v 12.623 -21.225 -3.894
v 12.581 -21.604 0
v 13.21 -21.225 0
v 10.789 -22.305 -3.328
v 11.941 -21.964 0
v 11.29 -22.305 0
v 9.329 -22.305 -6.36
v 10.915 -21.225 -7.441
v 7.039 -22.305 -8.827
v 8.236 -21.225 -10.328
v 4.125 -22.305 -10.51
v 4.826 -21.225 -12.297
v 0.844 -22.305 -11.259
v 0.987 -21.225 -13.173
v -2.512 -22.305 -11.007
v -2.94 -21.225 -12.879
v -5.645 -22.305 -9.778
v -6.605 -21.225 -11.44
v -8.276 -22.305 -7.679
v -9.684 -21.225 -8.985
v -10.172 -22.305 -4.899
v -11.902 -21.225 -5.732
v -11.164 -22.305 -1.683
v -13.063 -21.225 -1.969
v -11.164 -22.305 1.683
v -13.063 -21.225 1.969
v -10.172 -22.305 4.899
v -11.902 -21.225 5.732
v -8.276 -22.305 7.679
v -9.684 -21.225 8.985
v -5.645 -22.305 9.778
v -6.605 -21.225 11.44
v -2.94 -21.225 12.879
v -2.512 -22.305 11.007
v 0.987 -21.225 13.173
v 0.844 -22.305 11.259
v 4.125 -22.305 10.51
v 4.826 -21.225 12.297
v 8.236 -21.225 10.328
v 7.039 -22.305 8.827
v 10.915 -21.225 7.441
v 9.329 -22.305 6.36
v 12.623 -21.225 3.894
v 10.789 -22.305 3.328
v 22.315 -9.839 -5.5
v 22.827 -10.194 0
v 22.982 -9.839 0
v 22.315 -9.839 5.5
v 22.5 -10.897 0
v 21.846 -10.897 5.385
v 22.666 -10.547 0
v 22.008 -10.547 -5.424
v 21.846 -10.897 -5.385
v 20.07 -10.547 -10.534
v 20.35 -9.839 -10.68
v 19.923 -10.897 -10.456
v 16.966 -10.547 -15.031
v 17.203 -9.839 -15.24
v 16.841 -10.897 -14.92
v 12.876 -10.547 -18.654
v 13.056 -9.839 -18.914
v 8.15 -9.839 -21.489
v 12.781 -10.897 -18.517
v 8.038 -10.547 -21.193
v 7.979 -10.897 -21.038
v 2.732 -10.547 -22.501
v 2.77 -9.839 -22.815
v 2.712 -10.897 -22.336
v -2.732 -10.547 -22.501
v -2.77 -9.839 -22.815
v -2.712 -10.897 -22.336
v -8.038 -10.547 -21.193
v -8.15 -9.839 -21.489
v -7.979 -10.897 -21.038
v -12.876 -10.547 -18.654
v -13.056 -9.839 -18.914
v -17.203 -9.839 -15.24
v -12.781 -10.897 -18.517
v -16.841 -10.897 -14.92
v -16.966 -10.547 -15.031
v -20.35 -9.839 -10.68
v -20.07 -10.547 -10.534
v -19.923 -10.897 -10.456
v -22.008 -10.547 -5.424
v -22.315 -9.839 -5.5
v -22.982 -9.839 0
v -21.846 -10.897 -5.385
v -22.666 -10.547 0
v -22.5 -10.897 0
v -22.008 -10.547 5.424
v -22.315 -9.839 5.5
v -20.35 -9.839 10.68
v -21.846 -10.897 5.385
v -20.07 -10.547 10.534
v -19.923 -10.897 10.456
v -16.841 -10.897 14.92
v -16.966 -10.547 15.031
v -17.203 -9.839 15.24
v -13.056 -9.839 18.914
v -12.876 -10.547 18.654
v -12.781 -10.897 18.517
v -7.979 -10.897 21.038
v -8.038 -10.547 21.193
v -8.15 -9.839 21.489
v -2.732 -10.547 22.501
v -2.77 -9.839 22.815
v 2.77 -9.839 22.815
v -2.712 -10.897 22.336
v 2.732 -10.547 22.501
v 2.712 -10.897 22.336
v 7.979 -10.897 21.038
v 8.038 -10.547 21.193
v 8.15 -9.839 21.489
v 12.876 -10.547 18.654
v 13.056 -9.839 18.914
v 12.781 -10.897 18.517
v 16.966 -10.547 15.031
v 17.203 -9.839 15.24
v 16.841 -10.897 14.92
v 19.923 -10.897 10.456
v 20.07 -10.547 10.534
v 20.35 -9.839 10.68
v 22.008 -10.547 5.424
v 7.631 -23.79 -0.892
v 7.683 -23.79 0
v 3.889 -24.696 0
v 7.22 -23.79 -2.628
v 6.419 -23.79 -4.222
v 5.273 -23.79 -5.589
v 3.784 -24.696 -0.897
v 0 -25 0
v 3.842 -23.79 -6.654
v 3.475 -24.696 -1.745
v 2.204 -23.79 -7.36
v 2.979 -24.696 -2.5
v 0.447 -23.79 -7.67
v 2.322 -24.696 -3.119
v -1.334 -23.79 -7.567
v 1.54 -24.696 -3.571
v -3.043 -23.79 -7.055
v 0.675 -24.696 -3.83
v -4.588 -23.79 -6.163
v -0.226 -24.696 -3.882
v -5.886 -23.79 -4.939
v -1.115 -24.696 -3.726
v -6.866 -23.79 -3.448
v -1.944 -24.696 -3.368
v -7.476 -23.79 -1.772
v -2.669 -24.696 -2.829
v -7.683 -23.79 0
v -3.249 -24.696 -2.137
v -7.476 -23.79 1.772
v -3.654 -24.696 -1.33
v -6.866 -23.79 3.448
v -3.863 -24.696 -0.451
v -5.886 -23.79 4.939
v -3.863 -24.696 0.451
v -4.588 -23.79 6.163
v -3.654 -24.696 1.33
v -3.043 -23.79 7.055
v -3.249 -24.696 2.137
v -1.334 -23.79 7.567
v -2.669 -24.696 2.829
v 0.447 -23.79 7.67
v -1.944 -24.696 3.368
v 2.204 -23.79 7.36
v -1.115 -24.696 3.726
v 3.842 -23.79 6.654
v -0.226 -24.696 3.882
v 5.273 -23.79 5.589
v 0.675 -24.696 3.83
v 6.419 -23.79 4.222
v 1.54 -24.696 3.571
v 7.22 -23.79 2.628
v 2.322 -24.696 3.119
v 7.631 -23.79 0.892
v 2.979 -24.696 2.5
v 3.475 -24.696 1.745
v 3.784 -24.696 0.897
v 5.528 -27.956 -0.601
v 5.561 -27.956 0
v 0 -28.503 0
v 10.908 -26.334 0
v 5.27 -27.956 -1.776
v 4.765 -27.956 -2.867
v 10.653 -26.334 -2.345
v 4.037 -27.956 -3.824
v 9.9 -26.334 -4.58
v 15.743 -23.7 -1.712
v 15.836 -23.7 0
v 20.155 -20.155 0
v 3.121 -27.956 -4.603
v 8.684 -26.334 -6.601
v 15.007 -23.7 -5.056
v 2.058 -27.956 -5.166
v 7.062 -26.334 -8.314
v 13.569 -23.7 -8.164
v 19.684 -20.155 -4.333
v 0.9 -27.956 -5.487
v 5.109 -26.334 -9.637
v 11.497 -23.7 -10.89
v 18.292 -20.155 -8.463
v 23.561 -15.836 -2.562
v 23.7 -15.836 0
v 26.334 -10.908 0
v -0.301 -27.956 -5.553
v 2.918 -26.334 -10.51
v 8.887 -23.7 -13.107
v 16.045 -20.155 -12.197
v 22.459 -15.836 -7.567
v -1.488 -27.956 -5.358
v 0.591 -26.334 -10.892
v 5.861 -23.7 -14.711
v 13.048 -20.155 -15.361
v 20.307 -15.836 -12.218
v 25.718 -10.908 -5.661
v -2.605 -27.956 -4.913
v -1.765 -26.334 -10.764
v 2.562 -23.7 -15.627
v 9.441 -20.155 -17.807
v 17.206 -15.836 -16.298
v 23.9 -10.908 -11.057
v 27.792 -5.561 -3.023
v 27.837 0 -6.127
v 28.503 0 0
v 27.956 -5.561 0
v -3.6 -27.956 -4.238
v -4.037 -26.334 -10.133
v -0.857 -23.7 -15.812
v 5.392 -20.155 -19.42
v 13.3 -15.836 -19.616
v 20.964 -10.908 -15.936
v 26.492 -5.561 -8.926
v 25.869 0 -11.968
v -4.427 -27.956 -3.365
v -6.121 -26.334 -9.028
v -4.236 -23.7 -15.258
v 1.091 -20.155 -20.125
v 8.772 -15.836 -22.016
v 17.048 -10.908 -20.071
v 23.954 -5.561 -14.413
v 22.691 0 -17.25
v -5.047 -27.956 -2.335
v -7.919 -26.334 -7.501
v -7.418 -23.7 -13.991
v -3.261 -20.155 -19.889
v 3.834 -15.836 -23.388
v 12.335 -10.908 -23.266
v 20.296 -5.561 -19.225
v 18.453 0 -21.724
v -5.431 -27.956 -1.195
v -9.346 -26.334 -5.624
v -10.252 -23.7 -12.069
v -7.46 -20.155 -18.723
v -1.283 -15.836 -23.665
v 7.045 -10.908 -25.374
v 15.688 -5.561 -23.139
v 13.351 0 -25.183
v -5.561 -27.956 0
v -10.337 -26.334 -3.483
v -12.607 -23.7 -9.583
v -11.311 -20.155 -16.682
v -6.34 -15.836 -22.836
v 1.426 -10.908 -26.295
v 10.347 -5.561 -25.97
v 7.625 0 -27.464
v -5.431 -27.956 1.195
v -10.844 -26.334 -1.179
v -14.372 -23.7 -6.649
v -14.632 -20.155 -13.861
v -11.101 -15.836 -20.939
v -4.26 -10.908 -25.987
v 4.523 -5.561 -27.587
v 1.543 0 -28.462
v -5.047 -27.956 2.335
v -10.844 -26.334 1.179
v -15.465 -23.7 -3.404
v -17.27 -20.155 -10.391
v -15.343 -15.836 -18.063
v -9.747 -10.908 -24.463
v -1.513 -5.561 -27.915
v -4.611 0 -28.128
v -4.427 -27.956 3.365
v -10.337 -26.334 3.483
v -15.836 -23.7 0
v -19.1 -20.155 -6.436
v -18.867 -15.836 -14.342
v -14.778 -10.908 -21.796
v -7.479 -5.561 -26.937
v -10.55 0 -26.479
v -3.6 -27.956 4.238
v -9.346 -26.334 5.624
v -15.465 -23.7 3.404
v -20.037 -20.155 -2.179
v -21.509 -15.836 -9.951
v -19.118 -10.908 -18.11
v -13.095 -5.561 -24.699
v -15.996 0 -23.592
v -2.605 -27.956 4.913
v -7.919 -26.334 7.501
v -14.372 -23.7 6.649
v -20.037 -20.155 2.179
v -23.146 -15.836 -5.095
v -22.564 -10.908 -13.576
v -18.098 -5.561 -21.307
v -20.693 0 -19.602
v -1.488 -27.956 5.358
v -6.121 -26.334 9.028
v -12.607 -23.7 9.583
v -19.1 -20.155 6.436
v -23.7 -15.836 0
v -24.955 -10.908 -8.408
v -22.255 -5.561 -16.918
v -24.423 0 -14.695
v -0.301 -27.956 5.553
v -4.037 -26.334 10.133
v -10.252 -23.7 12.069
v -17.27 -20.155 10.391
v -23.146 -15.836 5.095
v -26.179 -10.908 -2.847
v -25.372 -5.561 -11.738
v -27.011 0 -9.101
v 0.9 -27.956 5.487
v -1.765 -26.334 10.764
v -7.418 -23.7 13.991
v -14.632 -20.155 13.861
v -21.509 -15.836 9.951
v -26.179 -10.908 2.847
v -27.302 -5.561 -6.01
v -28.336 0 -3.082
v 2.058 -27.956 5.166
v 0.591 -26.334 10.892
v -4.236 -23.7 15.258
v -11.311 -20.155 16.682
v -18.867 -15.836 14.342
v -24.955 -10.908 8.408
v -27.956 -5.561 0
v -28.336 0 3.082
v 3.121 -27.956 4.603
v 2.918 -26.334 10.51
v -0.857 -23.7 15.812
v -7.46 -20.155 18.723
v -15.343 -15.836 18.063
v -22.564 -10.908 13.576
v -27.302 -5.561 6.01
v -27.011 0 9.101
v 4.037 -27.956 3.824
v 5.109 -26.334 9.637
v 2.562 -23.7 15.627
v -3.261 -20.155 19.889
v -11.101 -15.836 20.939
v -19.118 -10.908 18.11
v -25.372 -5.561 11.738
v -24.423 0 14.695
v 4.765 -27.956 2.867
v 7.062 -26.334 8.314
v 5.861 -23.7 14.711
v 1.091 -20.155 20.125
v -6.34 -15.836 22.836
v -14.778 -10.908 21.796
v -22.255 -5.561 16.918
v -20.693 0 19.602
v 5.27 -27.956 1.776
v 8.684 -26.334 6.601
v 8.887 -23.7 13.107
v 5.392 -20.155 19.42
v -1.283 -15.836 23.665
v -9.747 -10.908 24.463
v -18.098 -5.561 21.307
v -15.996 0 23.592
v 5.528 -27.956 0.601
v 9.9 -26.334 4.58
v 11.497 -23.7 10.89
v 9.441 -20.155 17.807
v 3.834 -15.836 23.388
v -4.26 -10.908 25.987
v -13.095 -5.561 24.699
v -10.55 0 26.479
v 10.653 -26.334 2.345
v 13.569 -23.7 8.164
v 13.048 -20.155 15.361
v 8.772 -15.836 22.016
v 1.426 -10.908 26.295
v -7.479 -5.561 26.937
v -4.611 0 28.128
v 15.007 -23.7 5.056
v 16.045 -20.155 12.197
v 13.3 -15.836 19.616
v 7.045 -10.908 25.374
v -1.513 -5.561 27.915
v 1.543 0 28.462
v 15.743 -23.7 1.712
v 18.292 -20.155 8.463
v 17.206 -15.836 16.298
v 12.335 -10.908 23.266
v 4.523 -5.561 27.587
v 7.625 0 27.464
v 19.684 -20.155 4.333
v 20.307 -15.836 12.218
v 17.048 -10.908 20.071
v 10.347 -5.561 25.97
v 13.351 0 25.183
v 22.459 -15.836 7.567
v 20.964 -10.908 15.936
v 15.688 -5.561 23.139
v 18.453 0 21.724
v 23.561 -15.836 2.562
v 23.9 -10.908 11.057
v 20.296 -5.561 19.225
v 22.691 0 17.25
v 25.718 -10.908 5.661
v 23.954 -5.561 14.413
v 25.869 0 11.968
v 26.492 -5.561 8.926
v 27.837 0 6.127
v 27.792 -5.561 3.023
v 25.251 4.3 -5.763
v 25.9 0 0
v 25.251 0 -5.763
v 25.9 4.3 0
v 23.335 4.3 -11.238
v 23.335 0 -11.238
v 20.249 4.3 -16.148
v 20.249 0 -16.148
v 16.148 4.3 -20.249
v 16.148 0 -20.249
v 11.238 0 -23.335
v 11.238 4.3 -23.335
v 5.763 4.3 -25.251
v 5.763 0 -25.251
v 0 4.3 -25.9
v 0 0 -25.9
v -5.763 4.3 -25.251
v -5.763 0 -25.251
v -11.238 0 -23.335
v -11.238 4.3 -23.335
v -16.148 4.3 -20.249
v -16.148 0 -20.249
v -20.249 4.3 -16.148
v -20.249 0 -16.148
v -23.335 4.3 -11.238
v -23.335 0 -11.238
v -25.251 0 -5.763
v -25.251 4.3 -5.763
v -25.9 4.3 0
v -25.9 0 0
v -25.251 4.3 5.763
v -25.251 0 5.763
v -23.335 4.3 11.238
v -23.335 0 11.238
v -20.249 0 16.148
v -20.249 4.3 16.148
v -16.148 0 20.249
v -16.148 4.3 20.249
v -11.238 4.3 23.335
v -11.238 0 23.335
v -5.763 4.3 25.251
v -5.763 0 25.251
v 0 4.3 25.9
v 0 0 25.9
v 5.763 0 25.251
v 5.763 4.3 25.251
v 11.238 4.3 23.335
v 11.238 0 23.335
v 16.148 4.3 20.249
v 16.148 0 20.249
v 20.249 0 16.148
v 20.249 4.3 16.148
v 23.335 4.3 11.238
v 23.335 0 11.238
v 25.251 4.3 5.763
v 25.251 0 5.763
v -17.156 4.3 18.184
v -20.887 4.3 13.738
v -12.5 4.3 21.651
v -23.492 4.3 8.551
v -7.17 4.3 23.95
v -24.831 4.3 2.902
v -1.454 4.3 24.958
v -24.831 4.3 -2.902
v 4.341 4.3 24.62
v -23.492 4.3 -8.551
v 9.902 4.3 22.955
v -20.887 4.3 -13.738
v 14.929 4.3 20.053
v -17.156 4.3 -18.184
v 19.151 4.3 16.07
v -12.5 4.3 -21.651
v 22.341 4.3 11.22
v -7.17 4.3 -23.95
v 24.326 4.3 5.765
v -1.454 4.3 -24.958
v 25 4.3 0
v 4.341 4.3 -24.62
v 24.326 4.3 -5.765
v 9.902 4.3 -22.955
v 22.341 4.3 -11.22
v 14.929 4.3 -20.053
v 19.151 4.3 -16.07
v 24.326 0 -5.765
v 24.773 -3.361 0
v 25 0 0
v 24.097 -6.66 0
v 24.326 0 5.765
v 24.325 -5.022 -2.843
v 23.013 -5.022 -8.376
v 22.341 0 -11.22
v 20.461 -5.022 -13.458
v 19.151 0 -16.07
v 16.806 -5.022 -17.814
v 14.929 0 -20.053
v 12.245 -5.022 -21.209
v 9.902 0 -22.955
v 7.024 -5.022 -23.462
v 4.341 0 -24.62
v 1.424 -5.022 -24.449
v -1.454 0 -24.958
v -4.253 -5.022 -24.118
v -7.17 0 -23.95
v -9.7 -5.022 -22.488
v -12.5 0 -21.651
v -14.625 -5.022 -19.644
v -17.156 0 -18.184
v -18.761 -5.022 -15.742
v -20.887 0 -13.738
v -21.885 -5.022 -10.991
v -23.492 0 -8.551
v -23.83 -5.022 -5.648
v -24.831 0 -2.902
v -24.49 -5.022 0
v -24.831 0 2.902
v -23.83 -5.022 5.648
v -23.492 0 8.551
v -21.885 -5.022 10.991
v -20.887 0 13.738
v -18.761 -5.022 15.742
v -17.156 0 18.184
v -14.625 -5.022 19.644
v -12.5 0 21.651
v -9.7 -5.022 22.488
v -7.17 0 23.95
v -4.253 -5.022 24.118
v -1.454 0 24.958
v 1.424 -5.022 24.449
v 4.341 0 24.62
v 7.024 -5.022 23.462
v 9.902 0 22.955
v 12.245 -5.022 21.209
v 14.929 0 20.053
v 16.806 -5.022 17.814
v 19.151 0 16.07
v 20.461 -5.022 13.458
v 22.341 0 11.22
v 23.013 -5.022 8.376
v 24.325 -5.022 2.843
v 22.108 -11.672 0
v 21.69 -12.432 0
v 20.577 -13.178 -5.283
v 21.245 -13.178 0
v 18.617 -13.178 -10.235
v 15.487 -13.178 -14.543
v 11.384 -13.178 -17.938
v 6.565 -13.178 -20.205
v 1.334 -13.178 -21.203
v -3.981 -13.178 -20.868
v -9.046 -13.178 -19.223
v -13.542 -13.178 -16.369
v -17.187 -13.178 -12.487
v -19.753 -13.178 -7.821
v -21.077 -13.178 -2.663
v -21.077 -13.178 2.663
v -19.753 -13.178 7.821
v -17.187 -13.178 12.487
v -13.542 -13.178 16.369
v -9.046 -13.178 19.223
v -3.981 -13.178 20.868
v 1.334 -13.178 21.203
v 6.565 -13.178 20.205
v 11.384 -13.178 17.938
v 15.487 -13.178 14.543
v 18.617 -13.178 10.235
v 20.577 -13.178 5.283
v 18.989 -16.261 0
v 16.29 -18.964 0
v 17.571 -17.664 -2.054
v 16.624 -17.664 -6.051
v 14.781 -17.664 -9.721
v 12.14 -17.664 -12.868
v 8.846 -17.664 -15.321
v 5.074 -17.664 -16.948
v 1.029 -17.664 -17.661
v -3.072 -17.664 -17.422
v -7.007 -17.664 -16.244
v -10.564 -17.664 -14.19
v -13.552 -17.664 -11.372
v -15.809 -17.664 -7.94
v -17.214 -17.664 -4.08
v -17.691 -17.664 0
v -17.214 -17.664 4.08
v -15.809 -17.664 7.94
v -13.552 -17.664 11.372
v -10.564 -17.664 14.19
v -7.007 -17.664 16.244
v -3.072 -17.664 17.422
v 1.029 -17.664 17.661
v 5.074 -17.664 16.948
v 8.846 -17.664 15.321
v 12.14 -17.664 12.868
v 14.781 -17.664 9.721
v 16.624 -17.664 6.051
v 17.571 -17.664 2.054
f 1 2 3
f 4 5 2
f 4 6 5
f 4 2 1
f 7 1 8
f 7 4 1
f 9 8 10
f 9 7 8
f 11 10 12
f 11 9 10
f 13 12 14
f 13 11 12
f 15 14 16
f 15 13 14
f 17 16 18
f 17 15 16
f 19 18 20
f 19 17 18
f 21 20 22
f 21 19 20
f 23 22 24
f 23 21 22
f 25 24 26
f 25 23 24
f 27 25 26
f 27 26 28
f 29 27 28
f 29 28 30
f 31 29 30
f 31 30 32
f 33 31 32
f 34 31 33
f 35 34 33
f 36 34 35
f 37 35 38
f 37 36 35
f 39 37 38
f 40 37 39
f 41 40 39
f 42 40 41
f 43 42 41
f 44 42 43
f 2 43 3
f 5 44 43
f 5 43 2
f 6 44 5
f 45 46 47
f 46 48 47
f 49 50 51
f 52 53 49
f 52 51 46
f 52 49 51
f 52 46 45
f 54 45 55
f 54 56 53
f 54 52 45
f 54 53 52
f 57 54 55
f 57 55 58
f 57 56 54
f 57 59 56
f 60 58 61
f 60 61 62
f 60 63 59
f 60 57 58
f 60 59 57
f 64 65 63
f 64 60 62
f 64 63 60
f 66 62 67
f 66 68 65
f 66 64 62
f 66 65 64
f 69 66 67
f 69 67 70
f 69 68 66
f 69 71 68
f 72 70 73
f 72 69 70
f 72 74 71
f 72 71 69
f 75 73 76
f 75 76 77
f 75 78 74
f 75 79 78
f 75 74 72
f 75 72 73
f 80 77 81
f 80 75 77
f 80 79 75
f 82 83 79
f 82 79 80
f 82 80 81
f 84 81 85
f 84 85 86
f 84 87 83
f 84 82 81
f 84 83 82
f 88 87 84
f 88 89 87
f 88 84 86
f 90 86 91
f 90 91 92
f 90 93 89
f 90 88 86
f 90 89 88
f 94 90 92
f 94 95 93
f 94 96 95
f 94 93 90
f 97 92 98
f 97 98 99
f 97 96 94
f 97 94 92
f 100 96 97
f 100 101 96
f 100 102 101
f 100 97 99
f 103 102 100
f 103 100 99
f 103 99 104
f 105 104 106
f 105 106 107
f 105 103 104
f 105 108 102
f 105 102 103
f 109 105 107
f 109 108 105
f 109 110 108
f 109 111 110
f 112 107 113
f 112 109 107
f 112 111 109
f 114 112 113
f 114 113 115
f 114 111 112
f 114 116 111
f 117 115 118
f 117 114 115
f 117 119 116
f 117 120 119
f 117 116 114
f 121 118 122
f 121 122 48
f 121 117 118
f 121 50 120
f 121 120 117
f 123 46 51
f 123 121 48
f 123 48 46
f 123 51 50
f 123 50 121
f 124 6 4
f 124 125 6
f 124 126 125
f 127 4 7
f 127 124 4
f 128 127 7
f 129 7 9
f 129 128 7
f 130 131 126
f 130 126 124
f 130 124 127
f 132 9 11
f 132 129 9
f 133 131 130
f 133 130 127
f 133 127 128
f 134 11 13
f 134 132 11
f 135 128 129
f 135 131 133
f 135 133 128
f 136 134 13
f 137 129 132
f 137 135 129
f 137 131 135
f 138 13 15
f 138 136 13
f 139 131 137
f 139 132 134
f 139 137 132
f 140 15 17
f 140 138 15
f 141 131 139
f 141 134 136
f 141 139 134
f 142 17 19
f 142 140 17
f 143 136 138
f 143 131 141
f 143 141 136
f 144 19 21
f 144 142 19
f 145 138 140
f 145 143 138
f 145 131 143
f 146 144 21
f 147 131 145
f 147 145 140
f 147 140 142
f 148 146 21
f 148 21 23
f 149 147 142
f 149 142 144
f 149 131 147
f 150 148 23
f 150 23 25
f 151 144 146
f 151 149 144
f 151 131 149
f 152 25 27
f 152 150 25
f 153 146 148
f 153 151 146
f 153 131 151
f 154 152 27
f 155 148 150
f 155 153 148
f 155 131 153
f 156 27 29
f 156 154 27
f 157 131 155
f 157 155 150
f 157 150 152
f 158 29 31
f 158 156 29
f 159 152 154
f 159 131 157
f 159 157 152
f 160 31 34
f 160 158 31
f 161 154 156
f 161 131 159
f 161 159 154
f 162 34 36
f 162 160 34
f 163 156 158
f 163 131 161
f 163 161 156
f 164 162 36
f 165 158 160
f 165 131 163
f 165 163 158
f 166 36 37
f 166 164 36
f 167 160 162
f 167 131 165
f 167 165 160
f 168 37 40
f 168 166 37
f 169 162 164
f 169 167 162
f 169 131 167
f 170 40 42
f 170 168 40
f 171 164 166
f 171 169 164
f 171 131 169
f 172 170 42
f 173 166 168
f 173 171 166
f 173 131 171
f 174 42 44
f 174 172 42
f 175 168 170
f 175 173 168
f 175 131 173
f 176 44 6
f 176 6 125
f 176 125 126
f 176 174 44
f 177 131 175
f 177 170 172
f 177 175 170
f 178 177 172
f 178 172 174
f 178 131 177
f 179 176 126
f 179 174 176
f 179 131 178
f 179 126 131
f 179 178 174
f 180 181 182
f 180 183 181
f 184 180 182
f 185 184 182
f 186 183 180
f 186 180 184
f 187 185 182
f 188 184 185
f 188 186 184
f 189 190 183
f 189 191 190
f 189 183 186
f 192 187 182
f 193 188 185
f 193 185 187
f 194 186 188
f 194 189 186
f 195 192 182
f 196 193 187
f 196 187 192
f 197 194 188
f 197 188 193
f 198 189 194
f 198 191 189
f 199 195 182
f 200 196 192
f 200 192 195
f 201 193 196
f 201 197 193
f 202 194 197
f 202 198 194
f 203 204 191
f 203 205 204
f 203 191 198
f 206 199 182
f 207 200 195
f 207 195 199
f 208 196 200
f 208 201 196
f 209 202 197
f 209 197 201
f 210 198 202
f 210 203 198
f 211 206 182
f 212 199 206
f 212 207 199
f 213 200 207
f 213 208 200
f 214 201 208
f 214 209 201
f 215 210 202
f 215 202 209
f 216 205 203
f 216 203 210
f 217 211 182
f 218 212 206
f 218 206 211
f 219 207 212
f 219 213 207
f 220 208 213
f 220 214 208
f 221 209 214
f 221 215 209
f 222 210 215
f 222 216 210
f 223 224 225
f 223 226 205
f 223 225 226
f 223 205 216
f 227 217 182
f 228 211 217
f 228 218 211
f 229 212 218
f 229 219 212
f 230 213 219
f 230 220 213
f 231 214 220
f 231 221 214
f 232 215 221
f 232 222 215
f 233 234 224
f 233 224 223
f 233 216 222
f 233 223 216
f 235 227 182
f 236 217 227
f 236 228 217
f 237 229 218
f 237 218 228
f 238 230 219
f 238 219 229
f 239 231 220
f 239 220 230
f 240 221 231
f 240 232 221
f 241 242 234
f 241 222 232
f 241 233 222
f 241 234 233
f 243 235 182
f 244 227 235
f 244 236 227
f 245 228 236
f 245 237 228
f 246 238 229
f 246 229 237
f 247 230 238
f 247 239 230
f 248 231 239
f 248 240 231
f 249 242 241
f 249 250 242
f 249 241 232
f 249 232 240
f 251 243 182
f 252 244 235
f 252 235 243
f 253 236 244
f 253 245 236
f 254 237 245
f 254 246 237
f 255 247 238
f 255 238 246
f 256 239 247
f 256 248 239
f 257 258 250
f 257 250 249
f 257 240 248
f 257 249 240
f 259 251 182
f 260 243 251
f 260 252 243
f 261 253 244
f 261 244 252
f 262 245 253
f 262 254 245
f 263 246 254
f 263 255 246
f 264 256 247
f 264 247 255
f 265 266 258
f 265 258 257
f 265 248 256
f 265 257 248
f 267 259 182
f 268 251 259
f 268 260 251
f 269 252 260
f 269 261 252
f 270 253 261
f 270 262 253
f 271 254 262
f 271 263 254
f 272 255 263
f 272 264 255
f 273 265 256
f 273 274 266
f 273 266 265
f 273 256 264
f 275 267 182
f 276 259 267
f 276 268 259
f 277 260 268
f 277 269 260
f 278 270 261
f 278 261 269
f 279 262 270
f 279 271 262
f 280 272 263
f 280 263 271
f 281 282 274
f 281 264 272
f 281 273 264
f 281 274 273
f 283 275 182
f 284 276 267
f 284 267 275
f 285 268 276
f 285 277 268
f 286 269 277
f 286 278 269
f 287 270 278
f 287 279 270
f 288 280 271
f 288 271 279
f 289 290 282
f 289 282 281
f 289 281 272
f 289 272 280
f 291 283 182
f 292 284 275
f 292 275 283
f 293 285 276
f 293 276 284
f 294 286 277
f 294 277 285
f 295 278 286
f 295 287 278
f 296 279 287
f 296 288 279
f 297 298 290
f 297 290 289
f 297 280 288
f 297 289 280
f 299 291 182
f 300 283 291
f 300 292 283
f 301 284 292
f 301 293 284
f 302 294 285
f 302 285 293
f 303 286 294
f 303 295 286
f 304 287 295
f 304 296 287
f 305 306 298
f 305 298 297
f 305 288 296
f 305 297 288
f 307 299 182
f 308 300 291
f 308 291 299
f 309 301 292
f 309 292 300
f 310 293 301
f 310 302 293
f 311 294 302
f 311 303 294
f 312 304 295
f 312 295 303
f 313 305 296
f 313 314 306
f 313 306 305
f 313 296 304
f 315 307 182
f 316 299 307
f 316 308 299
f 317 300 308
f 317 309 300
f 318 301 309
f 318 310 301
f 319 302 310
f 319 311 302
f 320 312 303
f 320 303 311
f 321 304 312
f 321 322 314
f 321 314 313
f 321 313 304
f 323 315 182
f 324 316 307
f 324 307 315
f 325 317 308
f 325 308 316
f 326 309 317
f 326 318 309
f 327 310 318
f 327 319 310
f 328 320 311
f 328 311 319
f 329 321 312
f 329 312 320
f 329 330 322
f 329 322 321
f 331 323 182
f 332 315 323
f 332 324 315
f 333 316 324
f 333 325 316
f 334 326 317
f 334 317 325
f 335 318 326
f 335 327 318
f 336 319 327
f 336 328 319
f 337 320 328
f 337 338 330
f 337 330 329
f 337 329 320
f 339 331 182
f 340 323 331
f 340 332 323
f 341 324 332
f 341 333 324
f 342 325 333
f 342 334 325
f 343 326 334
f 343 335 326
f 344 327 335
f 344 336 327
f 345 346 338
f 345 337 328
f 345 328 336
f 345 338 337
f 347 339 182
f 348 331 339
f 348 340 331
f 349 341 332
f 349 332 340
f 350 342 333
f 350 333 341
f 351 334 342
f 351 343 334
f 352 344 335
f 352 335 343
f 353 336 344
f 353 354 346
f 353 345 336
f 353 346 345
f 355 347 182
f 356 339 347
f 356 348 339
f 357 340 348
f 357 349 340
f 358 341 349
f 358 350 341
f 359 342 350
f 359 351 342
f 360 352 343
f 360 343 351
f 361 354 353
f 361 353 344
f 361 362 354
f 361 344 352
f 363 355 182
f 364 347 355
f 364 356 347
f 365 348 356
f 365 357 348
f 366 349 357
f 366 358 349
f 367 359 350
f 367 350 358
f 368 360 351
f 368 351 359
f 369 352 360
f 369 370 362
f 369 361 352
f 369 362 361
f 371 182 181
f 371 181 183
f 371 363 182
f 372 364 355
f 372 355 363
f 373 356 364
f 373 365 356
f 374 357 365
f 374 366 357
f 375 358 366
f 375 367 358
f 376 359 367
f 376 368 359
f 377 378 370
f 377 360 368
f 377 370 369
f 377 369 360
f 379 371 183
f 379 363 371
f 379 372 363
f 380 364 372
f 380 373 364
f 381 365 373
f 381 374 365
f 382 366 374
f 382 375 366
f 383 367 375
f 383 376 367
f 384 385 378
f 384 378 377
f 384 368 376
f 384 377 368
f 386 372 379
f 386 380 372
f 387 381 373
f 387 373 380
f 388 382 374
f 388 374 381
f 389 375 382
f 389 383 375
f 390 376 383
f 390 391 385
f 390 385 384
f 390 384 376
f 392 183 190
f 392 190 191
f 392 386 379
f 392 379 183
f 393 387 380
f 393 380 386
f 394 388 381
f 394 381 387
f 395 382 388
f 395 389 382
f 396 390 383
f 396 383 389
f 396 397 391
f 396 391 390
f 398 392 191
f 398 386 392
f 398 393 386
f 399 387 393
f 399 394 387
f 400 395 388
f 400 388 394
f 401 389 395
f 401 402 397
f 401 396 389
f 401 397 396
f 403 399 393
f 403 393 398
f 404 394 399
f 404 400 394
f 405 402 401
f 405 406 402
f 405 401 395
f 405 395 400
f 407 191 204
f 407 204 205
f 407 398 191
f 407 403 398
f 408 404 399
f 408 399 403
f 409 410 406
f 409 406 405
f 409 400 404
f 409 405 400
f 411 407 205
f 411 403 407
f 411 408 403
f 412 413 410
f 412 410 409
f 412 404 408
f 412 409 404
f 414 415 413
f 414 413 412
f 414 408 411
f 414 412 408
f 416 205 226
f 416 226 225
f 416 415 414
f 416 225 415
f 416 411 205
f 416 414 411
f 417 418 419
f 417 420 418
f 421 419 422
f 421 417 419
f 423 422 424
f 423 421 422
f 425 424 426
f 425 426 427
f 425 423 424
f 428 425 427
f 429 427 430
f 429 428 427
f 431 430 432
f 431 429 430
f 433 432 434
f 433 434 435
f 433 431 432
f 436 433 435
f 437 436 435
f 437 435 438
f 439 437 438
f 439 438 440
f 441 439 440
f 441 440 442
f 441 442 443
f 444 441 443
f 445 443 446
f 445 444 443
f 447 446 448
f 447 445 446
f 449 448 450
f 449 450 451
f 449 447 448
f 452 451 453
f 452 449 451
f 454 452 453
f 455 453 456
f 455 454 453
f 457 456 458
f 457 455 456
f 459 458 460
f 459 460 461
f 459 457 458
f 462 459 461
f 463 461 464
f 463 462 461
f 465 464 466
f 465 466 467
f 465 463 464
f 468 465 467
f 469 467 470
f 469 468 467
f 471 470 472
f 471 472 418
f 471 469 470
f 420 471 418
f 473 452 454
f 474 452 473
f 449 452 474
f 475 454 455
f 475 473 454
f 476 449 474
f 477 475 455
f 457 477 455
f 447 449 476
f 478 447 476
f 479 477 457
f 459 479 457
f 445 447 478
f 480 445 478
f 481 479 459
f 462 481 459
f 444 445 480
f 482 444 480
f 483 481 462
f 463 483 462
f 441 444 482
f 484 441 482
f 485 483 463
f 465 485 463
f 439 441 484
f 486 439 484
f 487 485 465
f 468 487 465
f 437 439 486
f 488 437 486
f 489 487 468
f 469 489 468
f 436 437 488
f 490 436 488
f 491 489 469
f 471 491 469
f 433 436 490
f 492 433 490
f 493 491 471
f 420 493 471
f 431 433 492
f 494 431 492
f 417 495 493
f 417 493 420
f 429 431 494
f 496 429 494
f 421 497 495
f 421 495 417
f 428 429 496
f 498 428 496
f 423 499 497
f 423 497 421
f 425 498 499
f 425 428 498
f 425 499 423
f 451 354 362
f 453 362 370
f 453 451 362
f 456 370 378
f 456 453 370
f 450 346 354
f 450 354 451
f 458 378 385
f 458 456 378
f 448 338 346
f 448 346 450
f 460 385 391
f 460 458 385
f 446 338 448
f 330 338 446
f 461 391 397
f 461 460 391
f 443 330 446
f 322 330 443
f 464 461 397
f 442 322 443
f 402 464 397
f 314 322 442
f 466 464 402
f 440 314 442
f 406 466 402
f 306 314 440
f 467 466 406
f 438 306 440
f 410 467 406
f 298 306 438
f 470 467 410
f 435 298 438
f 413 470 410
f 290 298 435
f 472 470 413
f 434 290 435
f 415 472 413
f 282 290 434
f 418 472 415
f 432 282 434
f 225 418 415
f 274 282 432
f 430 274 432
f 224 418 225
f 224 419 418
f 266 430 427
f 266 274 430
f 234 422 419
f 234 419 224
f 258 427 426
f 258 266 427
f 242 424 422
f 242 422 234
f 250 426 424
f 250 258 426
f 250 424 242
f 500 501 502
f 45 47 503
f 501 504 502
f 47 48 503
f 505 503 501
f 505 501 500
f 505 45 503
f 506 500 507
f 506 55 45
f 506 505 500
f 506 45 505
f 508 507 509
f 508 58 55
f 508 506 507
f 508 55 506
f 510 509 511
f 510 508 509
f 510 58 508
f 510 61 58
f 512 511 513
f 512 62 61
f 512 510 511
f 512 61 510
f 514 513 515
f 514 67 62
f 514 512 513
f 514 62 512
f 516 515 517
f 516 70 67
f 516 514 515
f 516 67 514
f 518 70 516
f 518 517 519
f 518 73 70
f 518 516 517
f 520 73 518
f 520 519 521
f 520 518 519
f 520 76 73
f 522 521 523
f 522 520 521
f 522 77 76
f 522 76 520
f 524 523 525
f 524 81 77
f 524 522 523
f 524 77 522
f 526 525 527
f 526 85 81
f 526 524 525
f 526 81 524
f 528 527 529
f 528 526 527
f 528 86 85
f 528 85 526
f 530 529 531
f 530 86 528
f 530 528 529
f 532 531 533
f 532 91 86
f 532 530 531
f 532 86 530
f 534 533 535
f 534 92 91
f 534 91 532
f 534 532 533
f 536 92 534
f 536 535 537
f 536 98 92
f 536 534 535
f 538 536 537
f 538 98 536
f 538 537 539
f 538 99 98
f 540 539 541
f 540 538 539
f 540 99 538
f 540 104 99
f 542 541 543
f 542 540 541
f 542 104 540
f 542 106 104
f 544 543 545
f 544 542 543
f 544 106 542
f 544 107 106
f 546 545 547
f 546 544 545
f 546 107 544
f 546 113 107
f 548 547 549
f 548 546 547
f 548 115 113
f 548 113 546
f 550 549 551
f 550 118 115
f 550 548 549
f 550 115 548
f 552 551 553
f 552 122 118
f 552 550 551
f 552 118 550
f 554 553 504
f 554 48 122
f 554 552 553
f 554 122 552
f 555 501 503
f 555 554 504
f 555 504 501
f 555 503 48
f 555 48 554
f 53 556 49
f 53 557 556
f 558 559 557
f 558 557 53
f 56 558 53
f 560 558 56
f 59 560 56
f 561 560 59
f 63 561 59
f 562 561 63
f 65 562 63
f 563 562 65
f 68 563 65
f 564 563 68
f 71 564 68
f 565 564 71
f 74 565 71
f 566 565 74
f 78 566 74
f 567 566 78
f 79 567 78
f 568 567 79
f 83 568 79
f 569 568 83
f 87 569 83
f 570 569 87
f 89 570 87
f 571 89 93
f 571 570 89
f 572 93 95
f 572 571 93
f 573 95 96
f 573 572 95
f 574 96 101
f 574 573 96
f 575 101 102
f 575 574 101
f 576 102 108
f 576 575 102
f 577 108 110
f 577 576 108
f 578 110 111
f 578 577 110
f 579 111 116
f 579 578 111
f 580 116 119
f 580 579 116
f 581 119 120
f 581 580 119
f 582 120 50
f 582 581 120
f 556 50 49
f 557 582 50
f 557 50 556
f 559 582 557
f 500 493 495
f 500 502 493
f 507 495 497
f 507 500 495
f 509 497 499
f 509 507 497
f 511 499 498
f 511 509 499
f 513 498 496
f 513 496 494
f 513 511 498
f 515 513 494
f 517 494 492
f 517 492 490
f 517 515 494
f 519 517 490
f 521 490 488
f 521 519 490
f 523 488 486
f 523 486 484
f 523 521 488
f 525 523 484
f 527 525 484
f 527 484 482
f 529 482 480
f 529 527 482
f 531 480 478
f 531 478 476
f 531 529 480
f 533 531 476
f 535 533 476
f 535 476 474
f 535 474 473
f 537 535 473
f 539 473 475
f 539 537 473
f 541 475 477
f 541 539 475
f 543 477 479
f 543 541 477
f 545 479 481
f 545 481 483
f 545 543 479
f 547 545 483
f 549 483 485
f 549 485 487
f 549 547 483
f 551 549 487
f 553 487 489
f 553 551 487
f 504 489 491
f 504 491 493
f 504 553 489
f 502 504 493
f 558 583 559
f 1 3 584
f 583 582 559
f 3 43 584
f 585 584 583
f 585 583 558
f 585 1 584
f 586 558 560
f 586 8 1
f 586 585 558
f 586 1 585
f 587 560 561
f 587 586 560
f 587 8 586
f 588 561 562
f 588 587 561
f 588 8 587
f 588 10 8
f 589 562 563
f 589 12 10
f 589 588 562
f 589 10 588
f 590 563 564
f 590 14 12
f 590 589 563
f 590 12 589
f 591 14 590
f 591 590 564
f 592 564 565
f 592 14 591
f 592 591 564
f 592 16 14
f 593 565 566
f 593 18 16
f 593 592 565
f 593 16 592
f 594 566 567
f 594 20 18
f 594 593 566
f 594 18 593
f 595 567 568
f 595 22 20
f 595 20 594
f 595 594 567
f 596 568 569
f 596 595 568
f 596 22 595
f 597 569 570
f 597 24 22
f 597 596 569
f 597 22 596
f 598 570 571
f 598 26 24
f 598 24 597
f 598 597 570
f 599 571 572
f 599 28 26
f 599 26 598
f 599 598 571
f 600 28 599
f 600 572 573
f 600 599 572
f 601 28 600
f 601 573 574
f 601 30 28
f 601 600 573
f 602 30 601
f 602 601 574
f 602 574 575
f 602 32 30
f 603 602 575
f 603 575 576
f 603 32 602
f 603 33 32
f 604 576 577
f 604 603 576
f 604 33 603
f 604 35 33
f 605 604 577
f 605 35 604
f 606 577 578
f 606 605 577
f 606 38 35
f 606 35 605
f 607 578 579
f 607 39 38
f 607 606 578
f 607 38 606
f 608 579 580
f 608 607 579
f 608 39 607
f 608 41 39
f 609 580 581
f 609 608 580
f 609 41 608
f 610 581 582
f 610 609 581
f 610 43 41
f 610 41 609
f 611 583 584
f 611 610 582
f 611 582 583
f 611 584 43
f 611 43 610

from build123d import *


with BuildPart() as part:
    # Sketch1 → Revolve2 (revolve)
    with BuildSketch(Plane.XY, mode=Mode.PRIVATE) as revolve2_sk:
        with BuildLine():
            Line((0, -25), (0, -28.503418665))
            ThreePointArc((0, -28.503418665), (-20.154960625, -20.154960625), (-28.503418665, 0))
            Line((-28.503418665, 0), (-25.9, 0))
            Line((-25.9, 0), (-25.9, 2))
            Line((-25.9, 2), (-25.9, 2.5))
            Line((-25.9, 2.5), (-25.9, 4.3))
            Line((-25.9, 4.3), (-25, 4.3))
            Line((-25, 4.3), (-25, 0))
            ThreePointArc((-25, 0), (-24.490431494, -5.021828876), (-22.982498779, -9.838940484))
            ThreePointArc((-22.982498779, -9.838940484), (-22.747404845, -10.37090029), (-22.5, -10.897247359))
            ThreePointArc((-22.5, -10.897247359), (-21.902104859, -12.053953822), (-21.244795494, -13.177961315))
            ThreePointArc((-21.244795494, -13.177961315), (-17.691022269, -17.664306696), (-13.210052688, -21.2248559))
            ThreePointArc((-13.210052688, -21.2248559), (-12.26215849, -21.786222003), (-11.29045343, -22.305283261))
            ThreePointArc((-11.29045343, -22.305283261), (-5.803788352, -24.316990783), (0, -25))
        make_face()
    revolve(revolve2_sk.sketch.rotate(Axis((0, -29.246756477, 0), (0, 1, 0)), 180), axis=Axis((0, -29.246756477, 0), (0, 1, 0)))


solid = part.part
